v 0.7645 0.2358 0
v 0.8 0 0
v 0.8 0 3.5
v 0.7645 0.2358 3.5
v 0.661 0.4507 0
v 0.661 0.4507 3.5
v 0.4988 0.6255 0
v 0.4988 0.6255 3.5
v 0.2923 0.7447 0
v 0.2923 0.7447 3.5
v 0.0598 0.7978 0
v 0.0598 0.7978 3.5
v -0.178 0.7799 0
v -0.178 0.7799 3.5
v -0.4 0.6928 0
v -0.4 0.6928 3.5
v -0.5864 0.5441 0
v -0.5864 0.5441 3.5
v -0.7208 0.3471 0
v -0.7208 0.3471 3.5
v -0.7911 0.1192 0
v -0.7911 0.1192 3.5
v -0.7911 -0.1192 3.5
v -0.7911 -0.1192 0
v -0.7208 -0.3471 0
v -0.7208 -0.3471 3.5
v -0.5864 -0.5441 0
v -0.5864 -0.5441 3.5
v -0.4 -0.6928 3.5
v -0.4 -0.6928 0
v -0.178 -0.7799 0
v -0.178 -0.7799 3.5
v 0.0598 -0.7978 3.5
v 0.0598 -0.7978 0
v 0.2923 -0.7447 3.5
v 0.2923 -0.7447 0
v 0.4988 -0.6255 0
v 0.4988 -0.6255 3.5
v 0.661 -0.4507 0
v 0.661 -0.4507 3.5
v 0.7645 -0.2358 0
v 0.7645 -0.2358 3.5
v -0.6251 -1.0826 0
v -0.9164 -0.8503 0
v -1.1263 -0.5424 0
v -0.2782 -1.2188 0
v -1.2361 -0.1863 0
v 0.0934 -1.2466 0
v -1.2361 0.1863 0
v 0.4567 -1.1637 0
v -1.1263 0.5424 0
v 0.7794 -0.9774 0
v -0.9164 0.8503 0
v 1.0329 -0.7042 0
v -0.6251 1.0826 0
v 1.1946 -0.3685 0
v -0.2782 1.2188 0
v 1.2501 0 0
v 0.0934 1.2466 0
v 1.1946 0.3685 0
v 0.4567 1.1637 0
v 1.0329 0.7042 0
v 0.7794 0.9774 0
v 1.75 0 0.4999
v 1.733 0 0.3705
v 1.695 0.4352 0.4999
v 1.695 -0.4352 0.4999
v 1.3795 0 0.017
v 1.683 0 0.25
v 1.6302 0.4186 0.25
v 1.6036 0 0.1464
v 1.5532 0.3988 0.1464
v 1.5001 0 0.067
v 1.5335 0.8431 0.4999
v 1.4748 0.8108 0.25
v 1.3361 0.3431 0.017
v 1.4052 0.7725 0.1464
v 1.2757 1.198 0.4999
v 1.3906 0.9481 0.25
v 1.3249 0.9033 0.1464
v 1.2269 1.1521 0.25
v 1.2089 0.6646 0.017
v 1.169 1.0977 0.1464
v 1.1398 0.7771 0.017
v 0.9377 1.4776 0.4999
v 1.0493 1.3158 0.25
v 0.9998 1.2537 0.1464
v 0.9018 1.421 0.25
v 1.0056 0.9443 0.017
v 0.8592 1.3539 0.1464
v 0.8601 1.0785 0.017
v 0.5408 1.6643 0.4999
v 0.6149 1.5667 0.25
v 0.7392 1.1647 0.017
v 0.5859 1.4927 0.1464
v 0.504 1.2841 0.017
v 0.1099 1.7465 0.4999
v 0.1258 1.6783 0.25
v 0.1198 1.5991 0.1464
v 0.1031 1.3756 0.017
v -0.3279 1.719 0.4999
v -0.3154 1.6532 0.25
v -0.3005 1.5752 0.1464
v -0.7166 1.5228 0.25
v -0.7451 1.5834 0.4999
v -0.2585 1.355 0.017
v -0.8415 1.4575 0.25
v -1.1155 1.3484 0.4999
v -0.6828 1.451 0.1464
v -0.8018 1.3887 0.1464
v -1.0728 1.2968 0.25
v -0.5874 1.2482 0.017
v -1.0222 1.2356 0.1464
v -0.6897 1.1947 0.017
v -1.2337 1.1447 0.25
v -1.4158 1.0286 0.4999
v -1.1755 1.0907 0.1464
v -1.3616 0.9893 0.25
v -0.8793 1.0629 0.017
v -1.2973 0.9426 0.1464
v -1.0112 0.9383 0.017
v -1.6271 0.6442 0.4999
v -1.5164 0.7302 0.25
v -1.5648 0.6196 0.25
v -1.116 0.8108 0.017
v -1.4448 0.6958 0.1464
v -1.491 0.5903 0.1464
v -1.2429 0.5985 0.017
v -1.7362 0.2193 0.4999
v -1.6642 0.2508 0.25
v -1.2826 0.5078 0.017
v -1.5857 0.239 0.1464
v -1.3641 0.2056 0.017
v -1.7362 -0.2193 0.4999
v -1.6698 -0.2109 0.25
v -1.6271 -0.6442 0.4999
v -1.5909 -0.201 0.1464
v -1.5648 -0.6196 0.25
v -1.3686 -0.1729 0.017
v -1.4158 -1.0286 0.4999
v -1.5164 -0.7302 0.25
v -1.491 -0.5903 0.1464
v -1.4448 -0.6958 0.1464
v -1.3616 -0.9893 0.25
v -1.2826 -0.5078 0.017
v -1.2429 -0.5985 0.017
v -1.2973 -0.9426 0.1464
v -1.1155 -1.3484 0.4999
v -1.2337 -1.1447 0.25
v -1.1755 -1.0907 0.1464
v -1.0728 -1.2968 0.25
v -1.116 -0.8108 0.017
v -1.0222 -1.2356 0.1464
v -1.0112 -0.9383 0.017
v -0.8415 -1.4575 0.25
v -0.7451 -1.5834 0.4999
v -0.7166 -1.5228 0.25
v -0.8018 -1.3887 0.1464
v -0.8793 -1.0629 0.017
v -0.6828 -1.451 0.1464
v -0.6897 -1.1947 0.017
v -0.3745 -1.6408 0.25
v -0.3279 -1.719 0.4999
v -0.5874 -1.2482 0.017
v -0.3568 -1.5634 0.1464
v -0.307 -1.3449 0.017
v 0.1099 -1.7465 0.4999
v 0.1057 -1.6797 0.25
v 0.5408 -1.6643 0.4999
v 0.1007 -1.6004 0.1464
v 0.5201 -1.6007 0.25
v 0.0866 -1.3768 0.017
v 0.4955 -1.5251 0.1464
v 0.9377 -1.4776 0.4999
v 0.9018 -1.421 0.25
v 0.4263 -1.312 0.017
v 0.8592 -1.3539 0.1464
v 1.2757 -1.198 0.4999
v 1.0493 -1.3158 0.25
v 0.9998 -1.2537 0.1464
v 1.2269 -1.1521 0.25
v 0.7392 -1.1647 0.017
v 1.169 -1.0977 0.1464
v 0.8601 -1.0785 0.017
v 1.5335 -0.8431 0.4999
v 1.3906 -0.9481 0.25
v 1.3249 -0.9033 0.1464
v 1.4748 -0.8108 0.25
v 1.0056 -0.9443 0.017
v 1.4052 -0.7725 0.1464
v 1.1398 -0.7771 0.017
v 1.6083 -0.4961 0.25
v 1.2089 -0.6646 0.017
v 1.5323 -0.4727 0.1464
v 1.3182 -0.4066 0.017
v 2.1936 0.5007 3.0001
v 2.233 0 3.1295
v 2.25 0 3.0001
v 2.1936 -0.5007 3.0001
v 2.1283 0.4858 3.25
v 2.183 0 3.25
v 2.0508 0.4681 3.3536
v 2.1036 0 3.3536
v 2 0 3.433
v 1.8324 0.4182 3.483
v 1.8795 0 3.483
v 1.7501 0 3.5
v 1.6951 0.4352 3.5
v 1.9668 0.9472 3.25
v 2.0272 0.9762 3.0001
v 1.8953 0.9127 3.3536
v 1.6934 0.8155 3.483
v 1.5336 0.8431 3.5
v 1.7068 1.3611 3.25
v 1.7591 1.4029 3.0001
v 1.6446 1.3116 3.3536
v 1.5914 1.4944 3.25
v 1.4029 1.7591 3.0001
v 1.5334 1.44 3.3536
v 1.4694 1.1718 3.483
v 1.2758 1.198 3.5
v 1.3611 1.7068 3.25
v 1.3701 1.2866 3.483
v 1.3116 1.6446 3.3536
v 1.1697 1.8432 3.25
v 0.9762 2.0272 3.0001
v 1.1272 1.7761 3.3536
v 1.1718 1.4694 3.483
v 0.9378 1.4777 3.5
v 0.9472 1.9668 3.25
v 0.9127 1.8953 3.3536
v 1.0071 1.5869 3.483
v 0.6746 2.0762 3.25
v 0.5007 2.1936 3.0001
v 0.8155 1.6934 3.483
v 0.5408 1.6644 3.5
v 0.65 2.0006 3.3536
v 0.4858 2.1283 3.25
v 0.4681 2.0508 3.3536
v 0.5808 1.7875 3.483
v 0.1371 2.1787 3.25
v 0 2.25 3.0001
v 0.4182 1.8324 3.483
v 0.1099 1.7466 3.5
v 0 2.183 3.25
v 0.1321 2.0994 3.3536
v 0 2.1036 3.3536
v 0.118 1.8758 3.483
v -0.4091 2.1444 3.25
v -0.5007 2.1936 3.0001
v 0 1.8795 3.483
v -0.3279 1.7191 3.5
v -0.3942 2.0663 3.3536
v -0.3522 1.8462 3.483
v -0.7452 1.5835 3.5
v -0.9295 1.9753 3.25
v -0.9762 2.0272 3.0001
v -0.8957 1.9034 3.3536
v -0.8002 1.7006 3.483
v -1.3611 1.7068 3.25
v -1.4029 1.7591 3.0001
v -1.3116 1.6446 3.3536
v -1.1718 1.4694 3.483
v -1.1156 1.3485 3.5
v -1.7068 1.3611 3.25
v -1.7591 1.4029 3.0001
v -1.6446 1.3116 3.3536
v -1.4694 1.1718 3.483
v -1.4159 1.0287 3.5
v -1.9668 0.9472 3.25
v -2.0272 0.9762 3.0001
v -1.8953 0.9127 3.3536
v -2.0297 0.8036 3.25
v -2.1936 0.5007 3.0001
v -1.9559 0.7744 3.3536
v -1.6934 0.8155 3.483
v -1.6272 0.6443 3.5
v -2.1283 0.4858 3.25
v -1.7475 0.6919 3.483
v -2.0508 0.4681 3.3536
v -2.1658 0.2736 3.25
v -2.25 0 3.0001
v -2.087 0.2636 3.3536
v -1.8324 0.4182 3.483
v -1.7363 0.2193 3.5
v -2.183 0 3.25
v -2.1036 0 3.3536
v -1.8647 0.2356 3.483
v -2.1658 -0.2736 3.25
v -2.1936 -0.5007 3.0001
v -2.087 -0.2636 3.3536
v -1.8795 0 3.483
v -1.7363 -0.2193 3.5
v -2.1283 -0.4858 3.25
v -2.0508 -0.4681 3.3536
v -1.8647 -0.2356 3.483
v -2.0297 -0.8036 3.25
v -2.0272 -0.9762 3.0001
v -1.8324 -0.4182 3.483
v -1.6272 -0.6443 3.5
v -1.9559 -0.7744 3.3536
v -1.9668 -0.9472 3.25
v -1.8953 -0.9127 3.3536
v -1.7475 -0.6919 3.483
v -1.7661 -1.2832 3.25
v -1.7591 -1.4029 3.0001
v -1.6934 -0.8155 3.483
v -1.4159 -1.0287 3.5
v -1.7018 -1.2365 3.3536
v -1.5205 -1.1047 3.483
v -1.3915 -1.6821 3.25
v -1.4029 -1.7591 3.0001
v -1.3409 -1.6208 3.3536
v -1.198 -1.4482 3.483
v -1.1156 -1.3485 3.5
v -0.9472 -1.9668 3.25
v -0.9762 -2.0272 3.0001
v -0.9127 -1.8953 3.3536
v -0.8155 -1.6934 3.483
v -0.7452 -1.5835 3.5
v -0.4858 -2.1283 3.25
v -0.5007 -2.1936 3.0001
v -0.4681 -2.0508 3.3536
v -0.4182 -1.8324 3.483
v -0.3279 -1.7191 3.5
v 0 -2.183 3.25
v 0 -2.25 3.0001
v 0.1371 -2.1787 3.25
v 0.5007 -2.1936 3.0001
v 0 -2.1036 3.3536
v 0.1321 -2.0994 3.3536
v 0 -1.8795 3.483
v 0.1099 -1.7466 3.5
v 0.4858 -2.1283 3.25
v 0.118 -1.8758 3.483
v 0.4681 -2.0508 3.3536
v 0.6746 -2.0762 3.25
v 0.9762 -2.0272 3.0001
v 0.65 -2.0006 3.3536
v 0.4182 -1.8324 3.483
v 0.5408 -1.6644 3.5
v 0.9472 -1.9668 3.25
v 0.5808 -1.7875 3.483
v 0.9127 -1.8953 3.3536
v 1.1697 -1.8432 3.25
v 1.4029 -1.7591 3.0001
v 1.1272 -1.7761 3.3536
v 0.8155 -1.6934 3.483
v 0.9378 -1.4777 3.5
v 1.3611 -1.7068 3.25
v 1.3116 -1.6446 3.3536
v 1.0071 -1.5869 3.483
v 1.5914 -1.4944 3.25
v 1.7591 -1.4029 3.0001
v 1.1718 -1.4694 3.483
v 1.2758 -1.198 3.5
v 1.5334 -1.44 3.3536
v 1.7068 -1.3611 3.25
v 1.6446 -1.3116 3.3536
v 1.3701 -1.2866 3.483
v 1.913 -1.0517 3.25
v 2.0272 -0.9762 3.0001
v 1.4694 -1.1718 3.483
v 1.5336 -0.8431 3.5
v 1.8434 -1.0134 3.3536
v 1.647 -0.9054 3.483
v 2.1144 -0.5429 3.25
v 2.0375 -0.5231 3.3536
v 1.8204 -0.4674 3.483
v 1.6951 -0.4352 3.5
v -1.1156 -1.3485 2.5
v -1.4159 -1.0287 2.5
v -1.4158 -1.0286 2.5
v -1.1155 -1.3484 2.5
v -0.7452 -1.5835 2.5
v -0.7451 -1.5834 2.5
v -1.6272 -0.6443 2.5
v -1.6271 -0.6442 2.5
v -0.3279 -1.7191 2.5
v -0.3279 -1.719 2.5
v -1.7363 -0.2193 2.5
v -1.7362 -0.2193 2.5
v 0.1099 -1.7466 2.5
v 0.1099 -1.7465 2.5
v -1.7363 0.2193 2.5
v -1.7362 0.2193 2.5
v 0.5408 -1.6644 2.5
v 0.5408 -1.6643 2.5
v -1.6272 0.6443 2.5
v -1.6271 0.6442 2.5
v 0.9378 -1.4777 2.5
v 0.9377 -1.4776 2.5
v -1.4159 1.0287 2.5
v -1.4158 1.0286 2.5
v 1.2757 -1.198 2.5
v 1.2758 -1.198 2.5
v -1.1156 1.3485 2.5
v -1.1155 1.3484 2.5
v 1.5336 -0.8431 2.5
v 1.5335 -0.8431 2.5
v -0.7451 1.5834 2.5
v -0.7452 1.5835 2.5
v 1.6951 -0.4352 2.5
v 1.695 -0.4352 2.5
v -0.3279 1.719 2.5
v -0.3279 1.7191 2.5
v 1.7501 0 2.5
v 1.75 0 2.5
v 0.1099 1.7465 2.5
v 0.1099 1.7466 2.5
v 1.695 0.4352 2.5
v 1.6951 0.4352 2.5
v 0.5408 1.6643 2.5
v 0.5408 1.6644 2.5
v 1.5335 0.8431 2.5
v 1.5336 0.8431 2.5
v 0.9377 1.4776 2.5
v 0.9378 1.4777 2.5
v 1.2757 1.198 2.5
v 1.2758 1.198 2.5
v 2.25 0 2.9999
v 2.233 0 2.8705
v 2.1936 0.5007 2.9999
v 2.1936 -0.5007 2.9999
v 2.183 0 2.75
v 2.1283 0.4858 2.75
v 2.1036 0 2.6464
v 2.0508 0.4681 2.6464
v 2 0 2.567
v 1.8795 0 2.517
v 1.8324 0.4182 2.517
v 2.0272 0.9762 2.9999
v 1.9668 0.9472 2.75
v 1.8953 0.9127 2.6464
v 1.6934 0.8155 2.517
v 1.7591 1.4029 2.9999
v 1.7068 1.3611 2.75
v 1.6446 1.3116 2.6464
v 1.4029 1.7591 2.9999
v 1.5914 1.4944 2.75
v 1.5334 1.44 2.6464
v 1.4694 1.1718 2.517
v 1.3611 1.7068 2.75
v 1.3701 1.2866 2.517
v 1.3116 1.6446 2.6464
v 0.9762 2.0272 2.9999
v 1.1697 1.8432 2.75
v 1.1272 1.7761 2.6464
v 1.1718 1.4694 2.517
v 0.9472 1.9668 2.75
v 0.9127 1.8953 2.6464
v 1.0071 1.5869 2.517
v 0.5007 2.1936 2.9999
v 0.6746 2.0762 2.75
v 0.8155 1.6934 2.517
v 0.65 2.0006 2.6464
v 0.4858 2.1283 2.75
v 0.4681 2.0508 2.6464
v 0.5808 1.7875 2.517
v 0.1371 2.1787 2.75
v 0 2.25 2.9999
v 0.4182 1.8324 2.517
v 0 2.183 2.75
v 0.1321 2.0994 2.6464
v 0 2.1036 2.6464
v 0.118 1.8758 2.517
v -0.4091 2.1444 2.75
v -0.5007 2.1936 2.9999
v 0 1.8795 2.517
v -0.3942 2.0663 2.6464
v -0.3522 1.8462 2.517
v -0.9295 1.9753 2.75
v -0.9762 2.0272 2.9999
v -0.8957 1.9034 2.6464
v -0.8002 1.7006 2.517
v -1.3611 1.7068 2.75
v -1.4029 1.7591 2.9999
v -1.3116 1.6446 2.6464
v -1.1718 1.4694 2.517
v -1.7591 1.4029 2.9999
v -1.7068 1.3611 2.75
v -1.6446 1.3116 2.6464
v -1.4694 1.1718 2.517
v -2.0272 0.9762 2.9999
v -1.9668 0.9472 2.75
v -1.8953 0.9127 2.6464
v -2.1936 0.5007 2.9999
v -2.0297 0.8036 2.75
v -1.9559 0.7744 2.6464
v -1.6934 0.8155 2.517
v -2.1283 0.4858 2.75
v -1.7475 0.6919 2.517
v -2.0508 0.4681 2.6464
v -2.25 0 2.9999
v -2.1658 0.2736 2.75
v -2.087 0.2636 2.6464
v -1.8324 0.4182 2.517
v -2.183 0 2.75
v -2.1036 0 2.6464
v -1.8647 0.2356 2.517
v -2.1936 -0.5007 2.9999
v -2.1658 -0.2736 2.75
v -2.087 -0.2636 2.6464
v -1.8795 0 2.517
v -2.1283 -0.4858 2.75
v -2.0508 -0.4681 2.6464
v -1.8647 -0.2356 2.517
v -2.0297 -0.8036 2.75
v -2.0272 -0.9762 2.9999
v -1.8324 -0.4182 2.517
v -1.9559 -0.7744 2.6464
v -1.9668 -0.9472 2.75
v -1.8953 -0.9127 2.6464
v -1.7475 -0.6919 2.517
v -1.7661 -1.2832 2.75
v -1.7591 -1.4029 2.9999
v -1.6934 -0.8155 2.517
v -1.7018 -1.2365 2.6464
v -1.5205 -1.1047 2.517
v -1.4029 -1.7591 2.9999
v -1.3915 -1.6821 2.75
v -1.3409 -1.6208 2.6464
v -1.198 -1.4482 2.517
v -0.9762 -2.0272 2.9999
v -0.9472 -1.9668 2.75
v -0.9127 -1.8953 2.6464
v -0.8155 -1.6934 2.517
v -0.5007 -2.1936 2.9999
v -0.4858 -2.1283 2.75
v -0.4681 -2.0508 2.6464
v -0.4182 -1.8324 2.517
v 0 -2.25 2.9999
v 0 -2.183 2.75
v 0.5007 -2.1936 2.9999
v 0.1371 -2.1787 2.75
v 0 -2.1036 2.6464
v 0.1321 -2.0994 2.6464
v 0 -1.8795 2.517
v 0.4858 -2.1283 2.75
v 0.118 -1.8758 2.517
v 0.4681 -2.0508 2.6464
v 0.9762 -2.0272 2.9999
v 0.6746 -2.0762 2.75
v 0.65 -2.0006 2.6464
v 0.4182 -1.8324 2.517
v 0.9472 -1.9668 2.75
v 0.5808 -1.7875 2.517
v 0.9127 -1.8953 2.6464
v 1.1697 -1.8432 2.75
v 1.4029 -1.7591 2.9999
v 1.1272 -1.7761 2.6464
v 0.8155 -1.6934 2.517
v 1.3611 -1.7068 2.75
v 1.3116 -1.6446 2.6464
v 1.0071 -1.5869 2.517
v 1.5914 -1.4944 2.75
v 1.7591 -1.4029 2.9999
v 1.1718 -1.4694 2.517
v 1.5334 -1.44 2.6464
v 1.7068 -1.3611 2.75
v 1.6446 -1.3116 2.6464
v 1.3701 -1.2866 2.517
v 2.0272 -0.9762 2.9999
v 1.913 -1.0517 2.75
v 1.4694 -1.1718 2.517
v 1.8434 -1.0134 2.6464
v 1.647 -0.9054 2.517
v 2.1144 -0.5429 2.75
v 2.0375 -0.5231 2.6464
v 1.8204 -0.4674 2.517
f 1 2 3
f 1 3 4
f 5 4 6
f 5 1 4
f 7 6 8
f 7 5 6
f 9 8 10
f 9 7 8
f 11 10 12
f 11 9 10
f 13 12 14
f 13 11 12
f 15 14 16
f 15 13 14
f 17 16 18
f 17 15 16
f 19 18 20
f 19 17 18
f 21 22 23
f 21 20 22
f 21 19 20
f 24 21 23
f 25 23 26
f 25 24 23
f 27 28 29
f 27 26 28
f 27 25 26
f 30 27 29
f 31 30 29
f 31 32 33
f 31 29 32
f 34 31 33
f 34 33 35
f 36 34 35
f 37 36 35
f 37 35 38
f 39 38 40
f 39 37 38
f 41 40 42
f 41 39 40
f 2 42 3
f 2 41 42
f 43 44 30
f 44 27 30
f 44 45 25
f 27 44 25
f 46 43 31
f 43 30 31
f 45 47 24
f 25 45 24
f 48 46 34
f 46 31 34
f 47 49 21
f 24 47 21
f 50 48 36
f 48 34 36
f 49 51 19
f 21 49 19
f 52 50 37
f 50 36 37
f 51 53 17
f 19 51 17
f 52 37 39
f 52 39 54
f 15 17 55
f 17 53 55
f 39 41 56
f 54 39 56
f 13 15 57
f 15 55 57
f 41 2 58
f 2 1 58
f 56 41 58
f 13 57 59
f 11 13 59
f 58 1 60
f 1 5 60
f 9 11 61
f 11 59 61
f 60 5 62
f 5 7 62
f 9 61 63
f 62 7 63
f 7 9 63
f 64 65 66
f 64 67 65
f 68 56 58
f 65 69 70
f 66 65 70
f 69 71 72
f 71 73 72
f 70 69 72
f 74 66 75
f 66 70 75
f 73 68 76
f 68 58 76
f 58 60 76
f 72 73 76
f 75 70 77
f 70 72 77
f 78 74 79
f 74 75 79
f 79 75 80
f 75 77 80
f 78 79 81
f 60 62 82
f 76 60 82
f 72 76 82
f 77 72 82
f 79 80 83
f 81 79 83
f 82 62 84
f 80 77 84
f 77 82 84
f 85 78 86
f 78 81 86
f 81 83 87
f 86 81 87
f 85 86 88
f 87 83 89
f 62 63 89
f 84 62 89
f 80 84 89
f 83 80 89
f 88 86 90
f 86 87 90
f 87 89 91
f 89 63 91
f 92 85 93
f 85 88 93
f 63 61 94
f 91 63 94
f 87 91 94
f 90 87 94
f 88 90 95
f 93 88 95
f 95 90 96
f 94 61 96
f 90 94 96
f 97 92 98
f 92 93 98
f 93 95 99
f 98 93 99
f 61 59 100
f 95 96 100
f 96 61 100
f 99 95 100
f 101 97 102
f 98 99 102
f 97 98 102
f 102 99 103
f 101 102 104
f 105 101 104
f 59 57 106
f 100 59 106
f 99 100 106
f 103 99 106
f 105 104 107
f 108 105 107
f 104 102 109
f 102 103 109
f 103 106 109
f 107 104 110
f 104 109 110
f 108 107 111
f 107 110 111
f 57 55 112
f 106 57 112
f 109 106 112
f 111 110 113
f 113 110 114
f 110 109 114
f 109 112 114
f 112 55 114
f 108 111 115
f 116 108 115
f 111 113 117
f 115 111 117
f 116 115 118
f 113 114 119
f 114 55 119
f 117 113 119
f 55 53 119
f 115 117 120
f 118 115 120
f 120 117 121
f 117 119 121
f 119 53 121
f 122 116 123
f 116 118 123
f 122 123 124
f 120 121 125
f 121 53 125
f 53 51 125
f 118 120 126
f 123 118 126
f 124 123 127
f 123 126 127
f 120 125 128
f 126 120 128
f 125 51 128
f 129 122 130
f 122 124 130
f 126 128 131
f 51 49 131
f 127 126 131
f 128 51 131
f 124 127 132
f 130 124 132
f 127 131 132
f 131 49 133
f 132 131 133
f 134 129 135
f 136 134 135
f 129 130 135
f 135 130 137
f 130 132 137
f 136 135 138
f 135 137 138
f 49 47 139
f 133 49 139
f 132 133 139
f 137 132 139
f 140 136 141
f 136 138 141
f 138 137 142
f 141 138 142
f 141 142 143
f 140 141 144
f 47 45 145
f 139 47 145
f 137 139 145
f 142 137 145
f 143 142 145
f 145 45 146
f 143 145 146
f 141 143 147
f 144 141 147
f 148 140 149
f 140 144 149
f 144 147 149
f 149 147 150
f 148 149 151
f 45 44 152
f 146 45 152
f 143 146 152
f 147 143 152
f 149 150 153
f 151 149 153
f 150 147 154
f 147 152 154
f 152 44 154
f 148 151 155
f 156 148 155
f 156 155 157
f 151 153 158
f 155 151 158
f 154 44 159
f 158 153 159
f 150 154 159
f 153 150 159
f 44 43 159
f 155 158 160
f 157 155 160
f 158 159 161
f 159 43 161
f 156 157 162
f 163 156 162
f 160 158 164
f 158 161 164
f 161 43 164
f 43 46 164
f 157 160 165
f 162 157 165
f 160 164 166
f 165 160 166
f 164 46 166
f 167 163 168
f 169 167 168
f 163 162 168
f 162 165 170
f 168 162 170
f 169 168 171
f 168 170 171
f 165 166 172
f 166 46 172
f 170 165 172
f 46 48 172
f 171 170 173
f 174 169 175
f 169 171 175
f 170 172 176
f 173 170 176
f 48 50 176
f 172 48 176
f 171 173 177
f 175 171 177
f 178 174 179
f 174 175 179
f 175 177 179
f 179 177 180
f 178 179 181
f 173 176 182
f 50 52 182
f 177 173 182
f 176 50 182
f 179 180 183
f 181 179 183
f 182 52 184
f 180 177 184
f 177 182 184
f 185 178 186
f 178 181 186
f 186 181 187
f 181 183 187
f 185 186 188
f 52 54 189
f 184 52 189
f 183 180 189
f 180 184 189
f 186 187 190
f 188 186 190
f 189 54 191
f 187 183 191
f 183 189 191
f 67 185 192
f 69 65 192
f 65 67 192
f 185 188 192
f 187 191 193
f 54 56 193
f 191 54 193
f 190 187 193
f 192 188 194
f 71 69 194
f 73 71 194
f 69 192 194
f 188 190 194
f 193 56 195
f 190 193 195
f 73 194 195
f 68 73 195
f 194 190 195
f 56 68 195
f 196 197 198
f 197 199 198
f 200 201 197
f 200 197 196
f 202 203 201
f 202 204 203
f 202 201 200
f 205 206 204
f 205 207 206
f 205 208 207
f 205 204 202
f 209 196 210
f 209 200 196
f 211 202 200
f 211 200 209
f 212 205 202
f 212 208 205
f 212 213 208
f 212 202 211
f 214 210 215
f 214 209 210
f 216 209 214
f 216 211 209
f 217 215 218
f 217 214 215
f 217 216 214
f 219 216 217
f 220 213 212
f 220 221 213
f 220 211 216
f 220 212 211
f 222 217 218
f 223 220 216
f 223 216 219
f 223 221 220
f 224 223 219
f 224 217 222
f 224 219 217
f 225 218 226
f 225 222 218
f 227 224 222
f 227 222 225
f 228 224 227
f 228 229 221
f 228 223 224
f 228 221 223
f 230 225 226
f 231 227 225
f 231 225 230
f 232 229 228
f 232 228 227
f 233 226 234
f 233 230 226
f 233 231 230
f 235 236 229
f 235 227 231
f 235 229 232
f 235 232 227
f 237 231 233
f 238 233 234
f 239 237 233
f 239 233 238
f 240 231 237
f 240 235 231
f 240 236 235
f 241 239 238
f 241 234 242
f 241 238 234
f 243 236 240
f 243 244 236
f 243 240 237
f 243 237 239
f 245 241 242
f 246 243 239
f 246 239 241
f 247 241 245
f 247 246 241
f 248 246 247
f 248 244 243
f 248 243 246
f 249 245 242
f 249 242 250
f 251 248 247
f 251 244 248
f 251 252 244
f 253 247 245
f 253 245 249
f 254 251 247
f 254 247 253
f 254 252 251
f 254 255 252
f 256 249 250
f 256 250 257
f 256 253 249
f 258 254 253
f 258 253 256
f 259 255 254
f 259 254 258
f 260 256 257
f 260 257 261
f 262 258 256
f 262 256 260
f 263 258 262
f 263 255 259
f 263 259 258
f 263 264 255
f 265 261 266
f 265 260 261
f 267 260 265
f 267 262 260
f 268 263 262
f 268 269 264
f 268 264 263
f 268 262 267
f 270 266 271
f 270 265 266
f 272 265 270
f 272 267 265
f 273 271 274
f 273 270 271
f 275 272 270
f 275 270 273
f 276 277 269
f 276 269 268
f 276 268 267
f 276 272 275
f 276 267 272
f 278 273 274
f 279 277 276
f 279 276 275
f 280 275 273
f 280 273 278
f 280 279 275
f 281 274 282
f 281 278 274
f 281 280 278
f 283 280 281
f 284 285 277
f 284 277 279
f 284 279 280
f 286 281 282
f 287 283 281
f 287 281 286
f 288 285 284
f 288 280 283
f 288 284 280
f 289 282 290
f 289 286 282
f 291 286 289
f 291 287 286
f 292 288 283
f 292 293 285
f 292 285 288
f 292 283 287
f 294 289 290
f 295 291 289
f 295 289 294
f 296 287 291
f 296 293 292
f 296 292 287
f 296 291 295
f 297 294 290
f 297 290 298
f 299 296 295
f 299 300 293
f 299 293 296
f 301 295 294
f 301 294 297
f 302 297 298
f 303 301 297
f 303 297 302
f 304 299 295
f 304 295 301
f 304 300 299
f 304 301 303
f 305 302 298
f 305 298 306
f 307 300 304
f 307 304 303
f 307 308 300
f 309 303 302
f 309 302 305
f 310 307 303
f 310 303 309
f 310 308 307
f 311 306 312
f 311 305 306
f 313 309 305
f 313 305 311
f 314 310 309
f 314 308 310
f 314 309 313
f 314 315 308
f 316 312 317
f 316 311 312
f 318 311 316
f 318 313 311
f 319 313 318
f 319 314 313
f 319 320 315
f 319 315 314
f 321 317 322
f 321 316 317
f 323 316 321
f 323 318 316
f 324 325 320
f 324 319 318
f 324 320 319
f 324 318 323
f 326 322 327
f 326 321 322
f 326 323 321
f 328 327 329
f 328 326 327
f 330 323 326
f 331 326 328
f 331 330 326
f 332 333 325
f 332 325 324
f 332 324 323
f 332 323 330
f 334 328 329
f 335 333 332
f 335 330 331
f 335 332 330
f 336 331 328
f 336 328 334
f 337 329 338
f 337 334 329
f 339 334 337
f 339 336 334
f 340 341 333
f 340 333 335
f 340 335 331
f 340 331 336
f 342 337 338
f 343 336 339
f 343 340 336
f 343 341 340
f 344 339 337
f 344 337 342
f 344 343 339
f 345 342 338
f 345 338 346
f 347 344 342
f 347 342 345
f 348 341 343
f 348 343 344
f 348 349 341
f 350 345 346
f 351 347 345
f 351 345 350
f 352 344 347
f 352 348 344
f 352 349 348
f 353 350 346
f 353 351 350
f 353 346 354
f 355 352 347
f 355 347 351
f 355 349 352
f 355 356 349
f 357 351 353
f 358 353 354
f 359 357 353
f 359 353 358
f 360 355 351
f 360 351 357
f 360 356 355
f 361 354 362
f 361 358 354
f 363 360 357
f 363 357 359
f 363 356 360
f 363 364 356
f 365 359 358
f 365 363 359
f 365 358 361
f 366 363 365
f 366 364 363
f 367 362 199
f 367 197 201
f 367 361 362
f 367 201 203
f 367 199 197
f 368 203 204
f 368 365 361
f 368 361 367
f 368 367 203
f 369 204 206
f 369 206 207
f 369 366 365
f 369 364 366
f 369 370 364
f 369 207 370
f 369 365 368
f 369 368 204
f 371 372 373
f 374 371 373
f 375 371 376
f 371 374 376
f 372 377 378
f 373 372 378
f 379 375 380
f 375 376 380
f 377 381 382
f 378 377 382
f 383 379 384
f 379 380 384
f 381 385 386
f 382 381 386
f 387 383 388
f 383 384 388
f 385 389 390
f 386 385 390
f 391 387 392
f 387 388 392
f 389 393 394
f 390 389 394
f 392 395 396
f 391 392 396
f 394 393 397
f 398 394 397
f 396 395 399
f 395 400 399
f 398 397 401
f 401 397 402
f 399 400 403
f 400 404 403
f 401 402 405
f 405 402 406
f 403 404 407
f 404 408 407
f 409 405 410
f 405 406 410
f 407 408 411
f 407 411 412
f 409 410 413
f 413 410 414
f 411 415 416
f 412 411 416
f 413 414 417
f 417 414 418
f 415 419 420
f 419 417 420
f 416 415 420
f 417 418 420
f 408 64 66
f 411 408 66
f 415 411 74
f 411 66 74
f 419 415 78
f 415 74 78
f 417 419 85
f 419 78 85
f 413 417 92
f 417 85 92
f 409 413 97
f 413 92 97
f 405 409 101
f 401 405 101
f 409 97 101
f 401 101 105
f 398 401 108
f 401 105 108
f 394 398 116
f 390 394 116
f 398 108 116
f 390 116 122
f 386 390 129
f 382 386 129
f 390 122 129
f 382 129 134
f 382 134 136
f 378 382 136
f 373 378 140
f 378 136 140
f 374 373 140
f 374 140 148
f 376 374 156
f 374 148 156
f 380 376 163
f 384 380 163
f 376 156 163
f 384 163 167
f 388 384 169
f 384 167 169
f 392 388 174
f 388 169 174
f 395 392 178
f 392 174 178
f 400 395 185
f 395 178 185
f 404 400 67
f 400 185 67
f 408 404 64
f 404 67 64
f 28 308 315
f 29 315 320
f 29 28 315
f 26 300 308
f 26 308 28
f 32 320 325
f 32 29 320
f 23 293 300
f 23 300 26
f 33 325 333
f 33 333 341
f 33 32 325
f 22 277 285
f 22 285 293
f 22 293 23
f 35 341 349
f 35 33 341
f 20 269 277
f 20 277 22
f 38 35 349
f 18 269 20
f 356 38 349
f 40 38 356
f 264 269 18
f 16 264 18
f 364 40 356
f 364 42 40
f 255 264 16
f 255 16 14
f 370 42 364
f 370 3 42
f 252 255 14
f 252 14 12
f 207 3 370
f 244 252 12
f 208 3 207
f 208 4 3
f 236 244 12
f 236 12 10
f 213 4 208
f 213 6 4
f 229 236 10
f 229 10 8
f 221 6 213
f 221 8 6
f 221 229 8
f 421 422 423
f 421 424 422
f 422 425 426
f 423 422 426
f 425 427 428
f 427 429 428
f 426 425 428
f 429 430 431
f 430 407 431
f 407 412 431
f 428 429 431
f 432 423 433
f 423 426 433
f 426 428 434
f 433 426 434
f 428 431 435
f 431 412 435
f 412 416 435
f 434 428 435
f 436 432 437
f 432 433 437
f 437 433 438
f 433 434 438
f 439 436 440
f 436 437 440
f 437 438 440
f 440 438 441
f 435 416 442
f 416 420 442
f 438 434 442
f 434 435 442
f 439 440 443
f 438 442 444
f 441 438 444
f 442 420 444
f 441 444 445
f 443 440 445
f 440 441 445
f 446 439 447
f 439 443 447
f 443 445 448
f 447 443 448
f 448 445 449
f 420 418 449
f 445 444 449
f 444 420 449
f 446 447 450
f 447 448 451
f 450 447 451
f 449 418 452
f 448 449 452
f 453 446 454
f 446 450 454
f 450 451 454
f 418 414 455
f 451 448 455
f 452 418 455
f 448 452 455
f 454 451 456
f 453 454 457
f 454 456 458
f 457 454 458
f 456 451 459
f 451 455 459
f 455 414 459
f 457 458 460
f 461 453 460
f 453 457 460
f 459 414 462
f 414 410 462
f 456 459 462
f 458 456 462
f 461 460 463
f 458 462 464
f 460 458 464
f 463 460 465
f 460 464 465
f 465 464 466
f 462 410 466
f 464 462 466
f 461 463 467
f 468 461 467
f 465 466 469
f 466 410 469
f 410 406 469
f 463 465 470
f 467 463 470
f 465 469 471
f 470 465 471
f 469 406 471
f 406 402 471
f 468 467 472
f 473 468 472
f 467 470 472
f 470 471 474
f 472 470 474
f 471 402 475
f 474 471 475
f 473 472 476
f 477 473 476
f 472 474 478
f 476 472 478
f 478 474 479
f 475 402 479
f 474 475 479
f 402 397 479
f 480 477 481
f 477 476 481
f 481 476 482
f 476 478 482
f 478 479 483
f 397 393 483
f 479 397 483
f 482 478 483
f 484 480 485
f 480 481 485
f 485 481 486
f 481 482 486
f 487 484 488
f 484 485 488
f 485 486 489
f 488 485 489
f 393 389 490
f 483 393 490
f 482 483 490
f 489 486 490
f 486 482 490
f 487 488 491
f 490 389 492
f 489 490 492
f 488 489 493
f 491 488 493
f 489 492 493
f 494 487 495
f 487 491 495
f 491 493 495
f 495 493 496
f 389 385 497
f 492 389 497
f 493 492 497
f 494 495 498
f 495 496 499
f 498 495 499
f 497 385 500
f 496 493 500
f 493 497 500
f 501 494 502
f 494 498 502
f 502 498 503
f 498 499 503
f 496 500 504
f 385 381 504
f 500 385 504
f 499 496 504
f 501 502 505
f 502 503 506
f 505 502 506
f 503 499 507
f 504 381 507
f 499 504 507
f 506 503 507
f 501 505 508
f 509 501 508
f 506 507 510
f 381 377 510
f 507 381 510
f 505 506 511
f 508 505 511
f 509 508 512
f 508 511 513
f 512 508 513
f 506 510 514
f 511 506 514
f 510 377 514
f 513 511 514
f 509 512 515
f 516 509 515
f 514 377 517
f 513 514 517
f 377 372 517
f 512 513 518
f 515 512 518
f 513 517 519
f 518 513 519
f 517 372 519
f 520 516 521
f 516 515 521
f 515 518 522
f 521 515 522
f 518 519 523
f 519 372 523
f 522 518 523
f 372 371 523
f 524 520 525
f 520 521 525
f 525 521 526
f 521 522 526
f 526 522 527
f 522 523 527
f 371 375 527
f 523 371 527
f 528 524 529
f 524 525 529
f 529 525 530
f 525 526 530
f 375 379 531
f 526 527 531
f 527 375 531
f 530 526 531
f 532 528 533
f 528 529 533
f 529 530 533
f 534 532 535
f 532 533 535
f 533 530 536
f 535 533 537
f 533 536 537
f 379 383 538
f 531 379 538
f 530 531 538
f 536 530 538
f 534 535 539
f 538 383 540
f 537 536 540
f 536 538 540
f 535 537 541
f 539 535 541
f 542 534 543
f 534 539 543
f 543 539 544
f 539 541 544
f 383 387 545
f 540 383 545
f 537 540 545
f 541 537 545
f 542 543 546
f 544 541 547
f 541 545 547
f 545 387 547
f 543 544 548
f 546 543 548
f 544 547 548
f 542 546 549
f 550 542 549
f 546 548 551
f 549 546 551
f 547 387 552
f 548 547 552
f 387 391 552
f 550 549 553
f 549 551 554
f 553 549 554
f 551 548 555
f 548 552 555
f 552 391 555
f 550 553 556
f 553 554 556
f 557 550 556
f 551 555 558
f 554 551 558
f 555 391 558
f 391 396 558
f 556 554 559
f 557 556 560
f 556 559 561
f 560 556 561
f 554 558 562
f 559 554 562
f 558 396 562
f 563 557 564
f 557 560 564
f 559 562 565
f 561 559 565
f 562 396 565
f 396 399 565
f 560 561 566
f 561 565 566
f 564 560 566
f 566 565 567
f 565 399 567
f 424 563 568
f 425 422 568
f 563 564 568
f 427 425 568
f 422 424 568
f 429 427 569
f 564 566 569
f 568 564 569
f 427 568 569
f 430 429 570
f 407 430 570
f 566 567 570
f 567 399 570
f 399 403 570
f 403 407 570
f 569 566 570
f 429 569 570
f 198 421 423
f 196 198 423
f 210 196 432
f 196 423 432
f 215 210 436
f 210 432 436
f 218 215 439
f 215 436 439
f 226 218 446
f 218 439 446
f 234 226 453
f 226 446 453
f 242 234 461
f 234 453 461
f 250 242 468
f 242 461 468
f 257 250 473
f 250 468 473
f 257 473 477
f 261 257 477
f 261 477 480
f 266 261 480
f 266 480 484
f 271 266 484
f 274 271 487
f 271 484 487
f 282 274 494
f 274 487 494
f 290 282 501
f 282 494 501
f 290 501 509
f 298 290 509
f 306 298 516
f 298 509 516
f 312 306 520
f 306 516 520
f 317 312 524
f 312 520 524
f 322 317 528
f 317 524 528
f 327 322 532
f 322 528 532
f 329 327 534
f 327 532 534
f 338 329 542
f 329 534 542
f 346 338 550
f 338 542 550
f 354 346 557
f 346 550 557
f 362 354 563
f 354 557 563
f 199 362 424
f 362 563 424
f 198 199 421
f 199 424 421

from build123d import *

# Parameters (mm, degrees)
SKETCH_1_R               = 1.75
EXTRUDE_1_DEPTH          = 2.5
SKETCH_2_R               = 2.25
EXTRUDE_2_DEPTH          = 1
CUT_EXTRUDE_1_DEPTH      = 5.730221982
CUT_EXTRUDE_1_DEPTH_BACK = 5.730221982
SKETCH_3_R               = 0.8
FILLET_2_R               = 0.5


with BuildPart() as part:
    # 草图1 → 凸台-拉伸1 (new body)
    with BuildSketch(Plane.XY):
        Circle(SKETCH_1_R)
    extrude(amount=EXTRUDE_1_DEPTH)

    # 草图2 → 凸台-拉伸2 (add)
    with BuildSketch(Plane.XY.offset(2.5)):
        Circle(SKETCH_2_R)
    extrude(amount=EXTRUDE_2_DEPTH)

    # 草图3 → 切除-拉伸1 (cut, two sides: drawn at the far end of the back side and taken through both)
    with BuildSketch(Plane.XY.offset(3.5).offset(-CUT_EXTRUDE_1_DEPTH_BACK)):
        Circle(SKETCH_3_R)
    extrude(amount=CUT_EXTRUDE_1_DEPTH + CUT_EXTRUDE_1_DEPTH_BACK, mode=Mode.SUBTRACT)

    # 圆角2
    fillet_2_edges = [part.edges().sort_by_distance(p)[0] for p in [
        (-1.75, 0, 0),
        (-2.25, 0, 2.5),
        (-2.25, 0, 3.5),
    ]]
    fillet(fillet_2_edges, radius=FILLET_2_R - 0.0001)  # a hair under: the kernel refuses the full size


solid = part.part
